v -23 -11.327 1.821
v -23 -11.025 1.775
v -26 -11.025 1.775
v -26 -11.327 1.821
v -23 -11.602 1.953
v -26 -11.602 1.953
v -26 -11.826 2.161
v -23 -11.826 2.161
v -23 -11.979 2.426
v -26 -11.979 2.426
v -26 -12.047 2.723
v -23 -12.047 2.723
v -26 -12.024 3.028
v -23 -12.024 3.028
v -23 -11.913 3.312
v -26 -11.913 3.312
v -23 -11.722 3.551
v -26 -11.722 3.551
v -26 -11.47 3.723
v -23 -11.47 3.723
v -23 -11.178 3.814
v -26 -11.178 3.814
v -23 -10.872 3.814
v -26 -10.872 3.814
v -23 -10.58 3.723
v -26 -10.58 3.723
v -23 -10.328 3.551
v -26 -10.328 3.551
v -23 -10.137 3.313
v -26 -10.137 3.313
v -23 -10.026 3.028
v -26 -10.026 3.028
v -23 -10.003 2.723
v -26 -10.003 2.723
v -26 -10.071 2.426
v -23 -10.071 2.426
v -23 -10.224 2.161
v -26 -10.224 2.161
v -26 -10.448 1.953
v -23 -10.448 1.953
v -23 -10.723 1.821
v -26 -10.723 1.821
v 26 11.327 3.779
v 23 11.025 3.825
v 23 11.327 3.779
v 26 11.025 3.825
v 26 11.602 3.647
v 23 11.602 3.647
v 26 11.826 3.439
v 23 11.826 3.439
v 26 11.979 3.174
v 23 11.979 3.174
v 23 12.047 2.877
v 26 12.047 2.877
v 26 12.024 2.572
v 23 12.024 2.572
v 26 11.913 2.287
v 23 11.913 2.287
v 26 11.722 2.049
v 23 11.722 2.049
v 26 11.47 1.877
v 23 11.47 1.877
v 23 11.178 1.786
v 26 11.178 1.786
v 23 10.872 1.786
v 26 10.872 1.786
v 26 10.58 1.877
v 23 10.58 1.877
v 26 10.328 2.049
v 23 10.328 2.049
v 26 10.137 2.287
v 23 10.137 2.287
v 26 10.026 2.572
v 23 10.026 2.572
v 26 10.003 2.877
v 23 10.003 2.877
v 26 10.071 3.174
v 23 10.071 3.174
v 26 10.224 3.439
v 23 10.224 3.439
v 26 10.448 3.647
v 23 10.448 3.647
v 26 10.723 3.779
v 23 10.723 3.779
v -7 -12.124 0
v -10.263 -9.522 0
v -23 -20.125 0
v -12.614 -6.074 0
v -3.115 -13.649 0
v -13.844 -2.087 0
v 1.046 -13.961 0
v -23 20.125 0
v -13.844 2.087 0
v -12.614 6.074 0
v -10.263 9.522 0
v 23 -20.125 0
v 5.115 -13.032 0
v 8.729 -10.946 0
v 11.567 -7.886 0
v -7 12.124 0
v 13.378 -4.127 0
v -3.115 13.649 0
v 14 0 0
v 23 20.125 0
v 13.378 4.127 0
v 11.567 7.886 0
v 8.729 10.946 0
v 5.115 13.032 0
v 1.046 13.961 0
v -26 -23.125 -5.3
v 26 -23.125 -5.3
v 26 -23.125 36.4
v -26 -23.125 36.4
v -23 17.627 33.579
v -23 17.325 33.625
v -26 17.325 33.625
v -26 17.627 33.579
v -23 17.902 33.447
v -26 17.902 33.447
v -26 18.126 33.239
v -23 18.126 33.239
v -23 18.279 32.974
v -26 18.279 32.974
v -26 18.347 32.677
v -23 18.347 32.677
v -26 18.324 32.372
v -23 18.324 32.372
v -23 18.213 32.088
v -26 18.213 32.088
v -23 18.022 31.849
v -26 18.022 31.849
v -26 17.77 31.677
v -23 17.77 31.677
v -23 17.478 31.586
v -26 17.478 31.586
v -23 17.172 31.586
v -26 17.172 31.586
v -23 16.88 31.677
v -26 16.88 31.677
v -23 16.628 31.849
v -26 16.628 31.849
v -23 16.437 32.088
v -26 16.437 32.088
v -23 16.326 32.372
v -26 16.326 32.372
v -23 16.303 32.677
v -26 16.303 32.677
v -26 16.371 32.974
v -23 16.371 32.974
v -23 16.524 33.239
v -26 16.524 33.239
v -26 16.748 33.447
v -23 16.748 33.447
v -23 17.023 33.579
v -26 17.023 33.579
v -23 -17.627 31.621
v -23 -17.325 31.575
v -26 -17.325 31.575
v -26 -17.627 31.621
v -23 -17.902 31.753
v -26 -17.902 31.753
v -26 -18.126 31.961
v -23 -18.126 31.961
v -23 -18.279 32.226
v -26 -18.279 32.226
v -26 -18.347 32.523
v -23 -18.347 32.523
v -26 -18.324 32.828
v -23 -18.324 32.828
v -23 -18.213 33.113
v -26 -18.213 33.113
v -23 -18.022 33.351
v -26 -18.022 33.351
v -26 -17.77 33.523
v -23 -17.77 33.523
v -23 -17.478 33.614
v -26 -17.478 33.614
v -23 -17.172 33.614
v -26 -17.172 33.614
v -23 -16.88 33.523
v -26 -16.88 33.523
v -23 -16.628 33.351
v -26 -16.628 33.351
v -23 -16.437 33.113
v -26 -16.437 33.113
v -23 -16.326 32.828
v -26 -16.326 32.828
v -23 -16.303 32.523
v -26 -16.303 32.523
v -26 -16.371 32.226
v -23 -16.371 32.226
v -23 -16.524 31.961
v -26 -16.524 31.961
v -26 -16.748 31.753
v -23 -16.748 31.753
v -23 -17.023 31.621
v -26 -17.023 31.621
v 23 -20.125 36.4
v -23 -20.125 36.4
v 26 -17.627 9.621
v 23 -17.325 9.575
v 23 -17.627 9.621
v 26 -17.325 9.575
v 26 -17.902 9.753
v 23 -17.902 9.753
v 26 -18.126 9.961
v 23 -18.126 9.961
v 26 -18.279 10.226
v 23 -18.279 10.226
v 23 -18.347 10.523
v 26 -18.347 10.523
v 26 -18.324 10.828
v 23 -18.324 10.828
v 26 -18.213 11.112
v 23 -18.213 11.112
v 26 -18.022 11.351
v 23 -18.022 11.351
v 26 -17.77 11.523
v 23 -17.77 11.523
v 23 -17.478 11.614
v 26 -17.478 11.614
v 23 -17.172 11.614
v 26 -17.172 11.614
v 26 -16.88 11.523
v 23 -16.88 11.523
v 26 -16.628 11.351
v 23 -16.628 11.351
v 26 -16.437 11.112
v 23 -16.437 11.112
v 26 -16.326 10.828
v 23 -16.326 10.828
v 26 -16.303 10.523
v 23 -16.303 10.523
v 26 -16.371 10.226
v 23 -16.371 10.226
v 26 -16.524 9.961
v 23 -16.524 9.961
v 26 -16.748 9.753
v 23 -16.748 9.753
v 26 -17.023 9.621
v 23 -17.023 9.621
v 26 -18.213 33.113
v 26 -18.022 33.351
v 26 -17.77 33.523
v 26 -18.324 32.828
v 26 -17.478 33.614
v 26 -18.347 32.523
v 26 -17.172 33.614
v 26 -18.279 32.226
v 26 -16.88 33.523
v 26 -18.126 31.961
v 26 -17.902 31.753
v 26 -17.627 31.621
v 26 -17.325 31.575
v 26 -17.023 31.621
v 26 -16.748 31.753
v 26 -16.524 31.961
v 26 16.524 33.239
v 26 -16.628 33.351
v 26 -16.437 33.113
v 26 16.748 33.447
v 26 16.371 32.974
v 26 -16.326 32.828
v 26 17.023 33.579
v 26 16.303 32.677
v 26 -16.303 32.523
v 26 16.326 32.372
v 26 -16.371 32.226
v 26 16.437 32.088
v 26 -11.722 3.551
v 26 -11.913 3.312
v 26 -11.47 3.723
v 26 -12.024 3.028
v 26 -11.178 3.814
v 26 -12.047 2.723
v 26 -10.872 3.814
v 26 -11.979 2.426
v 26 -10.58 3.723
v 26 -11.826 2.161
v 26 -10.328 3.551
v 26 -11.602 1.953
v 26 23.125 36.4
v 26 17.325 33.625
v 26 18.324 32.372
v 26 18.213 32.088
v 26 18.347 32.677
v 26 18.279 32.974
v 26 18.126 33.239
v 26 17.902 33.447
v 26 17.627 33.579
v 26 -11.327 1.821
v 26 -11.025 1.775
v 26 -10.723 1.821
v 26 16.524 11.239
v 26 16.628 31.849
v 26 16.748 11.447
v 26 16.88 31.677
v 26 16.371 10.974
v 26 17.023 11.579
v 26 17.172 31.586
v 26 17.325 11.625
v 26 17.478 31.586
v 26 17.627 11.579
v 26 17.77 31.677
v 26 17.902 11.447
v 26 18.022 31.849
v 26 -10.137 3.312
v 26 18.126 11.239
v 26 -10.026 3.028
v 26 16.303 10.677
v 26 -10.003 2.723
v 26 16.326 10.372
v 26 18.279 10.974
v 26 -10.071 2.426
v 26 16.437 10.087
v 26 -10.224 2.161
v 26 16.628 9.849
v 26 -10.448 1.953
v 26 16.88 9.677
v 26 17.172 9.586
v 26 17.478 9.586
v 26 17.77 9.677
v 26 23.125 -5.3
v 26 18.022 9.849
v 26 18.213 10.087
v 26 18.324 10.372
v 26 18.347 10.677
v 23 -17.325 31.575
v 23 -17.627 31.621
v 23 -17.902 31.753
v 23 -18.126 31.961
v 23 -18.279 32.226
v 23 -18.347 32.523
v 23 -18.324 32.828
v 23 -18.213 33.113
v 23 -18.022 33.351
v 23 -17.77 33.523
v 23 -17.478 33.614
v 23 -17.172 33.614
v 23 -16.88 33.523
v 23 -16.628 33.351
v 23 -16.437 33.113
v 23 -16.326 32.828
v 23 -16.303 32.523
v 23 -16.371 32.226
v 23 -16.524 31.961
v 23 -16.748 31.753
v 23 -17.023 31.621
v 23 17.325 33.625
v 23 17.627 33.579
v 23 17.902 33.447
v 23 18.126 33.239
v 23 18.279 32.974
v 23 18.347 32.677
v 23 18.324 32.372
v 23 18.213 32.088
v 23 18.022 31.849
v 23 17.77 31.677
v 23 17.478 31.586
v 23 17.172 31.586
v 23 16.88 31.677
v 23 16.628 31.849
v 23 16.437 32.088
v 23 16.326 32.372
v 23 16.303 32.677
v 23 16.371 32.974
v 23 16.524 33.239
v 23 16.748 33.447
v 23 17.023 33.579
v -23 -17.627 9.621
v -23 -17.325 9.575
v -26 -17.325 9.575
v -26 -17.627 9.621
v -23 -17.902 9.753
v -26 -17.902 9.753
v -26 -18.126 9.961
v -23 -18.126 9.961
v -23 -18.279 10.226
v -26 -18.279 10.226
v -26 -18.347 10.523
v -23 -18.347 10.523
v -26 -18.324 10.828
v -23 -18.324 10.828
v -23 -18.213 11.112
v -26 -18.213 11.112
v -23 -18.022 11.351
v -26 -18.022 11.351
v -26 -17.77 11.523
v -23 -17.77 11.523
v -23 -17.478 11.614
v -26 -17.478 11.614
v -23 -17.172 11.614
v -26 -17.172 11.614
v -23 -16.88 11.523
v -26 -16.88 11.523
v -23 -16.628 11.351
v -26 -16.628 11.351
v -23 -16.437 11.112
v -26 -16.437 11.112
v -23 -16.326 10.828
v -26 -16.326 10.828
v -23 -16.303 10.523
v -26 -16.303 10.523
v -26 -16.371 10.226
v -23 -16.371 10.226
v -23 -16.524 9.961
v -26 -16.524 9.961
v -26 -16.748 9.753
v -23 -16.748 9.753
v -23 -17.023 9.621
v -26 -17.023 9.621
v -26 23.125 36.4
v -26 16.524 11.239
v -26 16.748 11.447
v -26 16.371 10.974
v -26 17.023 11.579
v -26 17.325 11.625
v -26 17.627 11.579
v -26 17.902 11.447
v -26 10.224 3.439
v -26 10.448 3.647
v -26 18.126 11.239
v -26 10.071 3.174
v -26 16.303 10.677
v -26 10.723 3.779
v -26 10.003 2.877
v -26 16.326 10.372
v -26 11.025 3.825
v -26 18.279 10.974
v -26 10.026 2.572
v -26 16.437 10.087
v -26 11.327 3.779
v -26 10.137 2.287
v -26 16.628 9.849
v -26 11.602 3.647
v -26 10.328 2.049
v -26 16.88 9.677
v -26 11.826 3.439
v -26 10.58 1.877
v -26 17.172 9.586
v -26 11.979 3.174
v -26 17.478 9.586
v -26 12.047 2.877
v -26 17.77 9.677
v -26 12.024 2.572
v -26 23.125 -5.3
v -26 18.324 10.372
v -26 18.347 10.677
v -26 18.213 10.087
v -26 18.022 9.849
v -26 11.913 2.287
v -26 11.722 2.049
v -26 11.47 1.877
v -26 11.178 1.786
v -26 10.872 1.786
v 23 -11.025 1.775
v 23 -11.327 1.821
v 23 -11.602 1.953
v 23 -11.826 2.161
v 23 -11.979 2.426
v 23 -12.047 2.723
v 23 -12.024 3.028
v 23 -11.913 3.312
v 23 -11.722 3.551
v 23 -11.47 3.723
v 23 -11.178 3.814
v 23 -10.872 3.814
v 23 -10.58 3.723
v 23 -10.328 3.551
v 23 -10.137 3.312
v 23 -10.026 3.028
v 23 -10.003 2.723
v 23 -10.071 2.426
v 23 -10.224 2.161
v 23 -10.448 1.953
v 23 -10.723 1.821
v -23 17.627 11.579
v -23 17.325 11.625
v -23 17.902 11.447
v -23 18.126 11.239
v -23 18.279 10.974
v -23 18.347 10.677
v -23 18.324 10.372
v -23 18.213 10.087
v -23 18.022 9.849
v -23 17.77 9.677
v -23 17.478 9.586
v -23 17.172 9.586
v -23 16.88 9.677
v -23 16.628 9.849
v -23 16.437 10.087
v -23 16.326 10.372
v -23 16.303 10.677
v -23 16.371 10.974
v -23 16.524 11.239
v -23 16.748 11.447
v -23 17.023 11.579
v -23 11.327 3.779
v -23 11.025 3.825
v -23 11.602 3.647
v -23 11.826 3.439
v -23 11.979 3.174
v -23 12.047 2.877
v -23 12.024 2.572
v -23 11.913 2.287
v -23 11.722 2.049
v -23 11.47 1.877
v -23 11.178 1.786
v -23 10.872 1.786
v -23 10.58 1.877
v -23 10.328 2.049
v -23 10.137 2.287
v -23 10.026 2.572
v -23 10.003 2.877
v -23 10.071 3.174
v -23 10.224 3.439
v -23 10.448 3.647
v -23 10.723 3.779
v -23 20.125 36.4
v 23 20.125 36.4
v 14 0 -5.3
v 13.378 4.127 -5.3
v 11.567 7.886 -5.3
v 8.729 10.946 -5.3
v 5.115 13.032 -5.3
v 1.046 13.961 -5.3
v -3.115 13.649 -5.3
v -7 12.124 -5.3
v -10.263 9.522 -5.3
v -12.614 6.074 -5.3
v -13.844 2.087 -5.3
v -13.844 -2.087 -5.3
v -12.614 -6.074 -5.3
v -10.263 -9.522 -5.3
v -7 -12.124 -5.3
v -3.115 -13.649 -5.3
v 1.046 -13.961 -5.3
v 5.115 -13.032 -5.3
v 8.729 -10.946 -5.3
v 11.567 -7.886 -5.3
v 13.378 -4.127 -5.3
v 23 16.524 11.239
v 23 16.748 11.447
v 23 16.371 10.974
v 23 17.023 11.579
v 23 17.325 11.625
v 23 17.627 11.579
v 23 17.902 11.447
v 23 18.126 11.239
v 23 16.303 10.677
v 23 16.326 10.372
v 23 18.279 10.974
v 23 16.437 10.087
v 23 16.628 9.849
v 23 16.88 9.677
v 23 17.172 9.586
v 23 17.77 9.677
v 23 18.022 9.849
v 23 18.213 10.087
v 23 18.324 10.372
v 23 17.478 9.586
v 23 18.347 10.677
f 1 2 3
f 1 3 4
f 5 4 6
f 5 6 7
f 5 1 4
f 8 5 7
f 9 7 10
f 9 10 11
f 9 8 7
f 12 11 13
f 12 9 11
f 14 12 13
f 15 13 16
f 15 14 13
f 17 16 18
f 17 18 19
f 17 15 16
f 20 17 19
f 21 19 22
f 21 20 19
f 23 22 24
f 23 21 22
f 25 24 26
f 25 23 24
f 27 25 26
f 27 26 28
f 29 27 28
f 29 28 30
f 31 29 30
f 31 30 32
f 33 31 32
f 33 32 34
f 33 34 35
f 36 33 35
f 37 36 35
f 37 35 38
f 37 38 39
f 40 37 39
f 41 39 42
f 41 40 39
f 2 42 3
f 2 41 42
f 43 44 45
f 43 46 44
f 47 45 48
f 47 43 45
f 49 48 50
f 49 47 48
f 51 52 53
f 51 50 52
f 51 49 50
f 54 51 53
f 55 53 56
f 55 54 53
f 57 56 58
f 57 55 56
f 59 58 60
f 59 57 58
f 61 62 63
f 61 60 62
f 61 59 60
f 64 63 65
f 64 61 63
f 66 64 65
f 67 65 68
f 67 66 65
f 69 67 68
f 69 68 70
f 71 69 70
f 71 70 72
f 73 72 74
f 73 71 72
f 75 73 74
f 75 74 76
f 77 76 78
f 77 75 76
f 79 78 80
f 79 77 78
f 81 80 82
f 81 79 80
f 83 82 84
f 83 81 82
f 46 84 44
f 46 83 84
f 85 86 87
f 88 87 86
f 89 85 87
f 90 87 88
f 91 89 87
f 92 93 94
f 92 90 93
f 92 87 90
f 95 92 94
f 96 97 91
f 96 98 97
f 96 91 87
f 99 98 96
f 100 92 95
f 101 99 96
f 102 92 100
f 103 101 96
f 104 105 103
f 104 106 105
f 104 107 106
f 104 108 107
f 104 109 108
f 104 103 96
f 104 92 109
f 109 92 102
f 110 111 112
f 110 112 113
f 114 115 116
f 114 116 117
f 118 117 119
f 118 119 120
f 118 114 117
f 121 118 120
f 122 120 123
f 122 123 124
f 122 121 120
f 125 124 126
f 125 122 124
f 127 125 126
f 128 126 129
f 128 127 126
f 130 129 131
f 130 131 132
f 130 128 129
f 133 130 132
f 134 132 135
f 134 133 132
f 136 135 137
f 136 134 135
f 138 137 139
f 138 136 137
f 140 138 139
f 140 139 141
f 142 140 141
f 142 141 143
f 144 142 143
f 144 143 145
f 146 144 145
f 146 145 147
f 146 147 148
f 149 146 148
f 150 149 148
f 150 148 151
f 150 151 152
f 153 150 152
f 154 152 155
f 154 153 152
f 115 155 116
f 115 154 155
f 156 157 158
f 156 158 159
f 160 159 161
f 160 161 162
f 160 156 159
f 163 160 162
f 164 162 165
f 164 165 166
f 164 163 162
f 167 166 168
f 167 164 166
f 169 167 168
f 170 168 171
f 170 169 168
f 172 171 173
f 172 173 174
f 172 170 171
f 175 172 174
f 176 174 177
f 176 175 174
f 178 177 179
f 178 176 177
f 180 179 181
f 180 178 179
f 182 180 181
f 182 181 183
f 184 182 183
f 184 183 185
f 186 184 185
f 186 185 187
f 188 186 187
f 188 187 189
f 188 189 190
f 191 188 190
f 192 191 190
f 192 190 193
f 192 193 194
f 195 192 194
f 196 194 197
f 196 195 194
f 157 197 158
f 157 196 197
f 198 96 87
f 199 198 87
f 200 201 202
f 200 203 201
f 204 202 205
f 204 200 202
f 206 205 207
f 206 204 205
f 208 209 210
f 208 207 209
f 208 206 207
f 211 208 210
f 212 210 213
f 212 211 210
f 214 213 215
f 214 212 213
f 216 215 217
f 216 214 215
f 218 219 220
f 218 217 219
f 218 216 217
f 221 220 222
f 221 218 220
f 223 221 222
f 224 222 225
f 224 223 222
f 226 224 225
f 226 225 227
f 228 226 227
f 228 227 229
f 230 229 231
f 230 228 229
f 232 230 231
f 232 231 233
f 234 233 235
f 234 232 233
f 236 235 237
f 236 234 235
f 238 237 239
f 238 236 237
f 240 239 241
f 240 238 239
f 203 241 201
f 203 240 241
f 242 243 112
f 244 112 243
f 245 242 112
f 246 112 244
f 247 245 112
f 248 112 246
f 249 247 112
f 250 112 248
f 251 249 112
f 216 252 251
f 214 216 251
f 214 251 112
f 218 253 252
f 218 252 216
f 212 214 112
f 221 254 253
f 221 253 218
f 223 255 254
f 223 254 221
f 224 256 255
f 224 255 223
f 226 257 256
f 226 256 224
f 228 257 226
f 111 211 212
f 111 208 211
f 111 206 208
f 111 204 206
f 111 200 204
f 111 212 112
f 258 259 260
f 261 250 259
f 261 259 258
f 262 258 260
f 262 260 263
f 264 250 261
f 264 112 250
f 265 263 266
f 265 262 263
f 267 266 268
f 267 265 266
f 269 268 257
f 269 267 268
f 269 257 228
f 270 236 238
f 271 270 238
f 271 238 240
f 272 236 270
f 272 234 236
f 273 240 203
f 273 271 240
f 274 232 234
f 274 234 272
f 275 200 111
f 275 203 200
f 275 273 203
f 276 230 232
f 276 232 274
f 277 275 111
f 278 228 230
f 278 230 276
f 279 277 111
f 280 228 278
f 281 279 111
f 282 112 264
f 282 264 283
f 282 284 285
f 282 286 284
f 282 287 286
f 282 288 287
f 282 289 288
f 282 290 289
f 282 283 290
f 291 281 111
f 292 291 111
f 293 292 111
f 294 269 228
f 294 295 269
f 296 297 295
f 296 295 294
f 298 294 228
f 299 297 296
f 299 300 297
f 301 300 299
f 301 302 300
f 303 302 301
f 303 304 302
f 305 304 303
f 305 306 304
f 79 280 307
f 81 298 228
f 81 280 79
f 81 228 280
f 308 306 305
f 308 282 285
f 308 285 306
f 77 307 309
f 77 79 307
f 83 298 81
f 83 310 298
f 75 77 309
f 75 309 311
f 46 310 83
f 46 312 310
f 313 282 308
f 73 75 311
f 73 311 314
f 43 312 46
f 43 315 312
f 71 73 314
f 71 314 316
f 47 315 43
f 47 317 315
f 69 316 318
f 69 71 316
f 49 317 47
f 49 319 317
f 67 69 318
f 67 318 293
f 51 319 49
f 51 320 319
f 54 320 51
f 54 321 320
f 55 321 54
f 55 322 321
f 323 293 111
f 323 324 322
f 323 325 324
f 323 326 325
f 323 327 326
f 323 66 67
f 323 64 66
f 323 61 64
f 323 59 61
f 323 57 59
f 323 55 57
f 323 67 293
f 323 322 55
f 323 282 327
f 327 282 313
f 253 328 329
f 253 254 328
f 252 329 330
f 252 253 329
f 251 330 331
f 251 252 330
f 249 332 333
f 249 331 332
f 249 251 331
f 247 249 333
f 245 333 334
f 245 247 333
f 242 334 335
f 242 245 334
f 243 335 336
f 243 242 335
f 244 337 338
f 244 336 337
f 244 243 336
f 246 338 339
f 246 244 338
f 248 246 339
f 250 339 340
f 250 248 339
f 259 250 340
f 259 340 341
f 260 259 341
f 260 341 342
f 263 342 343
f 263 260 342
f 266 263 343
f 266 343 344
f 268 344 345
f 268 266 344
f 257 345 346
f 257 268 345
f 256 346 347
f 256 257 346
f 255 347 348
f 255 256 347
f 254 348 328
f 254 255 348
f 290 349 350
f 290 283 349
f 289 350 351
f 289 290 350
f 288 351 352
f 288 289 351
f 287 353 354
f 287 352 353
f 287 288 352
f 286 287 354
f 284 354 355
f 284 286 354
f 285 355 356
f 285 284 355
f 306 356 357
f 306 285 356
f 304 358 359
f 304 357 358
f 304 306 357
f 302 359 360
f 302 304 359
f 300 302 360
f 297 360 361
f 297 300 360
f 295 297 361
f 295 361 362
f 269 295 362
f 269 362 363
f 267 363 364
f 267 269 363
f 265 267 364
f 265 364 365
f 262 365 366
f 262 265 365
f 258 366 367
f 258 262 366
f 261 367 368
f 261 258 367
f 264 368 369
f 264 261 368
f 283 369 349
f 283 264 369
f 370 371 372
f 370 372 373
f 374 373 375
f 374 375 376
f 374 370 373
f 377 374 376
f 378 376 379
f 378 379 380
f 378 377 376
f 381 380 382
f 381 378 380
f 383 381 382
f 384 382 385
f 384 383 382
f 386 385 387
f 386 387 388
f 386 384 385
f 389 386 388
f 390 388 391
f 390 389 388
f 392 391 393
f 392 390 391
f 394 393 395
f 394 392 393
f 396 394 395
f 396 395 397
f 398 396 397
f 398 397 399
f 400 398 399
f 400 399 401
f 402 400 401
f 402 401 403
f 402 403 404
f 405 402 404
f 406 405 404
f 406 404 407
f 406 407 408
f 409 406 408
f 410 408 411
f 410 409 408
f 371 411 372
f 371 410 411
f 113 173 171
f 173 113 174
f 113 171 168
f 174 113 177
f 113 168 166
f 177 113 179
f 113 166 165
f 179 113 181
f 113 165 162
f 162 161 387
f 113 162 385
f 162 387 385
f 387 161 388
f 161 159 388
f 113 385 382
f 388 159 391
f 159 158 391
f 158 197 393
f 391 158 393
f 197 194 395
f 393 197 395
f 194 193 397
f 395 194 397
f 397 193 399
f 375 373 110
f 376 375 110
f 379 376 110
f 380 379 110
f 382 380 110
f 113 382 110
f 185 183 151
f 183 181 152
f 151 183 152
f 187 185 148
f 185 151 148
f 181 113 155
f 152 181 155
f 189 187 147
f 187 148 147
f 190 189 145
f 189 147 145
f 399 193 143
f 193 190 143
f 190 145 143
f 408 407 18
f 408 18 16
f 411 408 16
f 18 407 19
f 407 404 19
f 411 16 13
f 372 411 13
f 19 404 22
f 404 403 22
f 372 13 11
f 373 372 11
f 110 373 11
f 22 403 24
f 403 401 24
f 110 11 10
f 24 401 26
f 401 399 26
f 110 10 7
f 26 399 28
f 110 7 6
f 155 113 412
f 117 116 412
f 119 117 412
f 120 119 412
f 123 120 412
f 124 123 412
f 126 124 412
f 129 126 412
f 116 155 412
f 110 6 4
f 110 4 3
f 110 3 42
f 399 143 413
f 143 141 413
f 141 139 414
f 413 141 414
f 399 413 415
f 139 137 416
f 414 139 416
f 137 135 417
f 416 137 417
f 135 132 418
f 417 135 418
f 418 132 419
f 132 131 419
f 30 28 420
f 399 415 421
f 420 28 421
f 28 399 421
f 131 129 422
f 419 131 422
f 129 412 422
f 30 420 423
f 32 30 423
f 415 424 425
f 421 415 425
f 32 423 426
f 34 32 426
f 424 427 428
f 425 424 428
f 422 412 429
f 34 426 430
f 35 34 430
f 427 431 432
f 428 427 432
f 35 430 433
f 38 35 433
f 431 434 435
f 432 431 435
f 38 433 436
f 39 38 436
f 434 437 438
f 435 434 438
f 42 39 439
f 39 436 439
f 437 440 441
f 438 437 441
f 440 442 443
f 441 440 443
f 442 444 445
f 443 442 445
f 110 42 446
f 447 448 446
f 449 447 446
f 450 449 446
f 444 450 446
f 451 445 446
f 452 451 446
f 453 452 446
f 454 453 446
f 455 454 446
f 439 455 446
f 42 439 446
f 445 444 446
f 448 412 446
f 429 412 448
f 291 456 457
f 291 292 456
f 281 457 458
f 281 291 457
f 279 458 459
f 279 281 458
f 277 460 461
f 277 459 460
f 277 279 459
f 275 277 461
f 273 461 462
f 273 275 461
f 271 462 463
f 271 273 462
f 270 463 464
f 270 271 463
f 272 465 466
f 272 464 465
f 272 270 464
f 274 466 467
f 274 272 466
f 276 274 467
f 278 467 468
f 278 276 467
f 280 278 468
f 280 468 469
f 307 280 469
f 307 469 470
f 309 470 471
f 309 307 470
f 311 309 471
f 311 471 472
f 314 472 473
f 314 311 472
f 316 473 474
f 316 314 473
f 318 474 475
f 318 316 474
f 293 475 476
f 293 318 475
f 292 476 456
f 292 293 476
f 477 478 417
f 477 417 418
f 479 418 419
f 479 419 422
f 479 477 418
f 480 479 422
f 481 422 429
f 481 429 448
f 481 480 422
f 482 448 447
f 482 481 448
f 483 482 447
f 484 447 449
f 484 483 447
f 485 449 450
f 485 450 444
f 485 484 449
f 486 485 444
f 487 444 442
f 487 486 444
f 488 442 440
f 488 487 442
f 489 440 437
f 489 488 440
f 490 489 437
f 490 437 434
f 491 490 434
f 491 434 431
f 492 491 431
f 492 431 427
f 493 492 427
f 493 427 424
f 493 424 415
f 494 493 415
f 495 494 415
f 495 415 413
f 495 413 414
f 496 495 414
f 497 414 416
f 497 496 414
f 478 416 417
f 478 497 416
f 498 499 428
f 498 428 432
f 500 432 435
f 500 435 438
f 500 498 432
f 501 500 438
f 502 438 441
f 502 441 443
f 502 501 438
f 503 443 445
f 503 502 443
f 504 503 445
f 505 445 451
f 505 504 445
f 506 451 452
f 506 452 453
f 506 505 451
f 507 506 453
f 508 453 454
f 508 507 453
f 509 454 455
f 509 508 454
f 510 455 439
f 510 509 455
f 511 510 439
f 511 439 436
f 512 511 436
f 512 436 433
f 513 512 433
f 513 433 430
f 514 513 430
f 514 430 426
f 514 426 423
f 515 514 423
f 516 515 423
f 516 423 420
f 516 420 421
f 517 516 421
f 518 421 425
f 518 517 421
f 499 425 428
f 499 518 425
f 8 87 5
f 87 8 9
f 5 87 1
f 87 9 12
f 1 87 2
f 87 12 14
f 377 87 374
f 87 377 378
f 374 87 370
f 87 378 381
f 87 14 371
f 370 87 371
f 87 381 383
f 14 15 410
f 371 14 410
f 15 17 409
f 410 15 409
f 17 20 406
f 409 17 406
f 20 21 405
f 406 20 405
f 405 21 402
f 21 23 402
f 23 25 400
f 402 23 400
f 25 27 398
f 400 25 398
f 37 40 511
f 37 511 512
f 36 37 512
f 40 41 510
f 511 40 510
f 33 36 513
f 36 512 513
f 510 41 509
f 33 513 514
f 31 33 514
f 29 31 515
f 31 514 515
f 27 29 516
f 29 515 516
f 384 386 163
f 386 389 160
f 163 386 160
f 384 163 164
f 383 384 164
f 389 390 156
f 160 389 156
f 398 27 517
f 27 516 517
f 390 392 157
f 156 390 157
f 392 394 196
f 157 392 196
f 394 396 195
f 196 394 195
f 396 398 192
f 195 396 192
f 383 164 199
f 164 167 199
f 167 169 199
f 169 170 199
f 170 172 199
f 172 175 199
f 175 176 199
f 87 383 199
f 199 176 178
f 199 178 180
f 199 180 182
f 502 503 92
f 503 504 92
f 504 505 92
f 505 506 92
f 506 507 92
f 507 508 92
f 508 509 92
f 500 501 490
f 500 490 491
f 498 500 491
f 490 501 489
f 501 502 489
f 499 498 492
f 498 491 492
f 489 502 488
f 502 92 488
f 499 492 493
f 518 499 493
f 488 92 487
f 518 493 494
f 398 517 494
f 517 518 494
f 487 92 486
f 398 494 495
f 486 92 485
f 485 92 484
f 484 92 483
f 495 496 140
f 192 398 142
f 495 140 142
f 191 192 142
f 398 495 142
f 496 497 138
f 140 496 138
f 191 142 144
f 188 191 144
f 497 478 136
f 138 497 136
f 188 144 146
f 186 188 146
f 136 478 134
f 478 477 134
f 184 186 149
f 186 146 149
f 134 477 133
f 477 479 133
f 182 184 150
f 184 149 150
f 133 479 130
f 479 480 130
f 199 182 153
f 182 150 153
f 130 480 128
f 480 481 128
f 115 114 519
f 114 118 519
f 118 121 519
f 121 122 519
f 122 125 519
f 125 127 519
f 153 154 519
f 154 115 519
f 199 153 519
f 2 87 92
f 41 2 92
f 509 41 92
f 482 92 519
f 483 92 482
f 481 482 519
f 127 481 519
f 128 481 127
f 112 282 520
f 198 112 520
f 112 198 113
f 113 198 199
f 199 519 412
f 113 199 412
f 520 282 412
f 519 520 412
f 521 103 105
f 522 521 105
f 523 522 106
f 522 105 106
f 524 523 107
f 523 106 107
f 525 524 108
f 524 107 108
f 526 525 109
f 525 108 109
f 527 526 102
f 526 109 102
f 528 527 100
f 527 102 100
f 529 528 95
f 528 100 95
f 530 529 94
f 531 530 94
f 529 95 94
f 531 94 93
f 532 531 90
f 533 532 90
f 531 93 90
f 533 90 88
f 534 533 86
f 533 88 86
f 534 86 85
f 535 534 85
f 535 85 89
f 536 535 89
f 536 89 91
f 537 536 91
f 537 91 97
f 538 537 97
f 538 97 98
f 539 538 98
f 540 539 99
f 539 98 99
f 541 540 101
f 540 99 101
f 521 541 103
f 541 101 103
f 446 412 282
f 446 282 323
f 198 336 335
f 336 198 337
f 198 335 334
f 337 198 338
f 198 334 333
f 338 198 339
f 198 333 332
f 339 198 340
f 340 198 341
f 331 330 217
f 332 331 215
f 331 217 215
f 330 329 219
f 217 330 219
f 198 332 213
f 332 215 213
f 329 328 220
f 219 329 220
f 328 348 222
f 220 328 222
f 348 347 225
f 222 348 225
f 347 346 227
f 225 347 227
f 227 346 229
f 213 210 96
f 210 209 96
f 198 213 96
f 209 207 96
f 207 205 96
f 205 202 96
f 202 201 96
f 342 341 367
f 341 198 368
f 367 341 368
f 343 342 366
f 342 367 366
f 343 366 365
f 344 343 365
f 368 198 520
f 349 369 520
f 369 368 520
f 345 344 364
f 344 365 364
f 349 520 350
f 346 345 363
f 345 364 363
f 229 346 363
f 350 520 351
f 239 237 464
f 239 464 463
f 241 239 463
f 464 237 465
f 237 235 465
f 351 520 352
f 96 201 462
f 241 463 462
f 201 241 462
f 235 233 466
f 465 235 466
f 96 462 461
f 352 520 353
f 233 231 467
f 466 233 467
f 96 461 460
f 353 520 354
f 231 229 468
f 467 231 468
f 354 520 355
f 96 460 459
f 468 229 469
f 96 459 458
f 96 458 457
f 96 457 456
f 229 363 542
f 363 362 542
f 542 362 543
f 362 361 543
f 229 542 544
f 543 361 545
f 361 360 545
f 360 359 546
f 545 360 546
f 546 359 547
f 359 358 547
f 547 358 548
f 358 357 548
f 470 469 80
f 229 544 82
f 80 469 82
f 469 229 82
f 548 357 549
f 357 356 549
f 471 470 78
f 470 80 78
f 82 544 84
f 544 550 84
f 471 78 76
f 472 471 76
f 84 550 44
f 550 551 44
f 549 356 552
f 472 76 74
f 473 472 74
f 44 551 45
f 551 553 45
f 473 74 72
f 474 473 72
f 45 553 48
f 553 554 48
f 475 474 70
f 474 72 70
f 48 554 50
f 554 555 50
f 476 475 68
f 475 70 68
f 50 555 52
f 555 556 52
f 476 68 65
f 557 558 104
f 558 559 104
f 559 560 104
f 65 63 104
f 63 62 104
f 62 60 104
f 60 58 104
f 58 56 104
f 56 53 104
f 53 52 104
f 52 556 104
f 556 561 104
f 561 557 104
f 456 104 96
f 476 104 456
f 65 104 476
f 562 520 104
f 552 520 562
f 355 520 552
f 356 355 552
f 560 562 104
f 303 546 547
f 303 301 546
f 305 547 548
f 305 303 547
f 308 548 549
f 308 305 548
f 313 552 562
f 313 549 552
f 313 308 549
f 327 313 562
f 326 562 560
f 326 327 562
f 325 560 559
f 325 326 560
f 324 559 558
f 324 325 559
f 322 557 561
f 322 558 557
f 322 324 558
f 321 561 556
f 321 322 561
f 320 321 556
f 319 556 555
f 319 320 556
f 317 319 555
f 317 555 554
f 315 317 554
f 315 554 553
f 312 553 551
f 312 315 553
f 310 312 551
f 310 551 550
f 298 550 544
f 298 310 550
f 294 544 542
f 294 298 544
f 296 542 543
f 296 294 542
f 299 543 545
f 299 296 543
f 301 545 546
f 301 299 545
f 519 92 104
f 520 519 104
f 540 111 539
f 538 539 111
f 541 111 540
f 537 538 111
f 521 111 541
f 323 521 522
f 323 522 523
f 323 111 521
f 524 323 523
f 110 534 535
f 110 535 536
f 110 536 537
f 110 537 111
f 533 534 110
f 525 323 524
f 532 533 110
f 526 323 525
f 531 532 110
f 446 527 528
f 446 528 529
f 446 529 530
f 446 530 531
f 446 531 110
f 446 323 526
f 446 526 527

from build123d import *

# Parameters (mm, degrees)
ESBO_O1_W                  = 46
ESBO_O1_H                  = 40.25
ESBO_O1_R                  = 14
RESSALTO_EXTRUS_O1_DEPTH   = 5.3
ESBO_O2_W                  = 41.7
ESBO_O2_H                  = 40.25
ESBO_O2_R                  = 1.025
RESSALTO_EXTRUS_O2_DEPTH   = 3
ESBO_O3_W                  = 49
ESBO_O3_H                  = 41.7
RESSALTO_EXTRUS_O3_DEPTH   = 3
ESBO_O4_W                  = 41.7
ESBO_O4_H                  = 43.25
RESSALTO_EXTRUS_O4_DEPTH   = 3
ESBO_O5_W                  = 52
ESBO_O5_H                  = 41.7
RESSALTO_EXTRUS_O5_DEPTH   = 3
CORTE_EXTRUS_O1_DEPTH      = 66.274234005
CORTE_EXTRUS_O1_DEPTH_BACK = 66.274234005
ESBO_O7_R                  = 1.025


with BuildPart() as part:
    # Esboço1 → Ressalto-extrusão1 (new body)
    with BuildSketch(Plane.XY):
        Rectangle(ESBO_O1_W, ESBO_O1_H)
        Circle(ESBO_O1_R, mode=Mode.SUBTRACT)
    extrude(amount=-RESSALTO_EXTRUS_O1_DEPTH)

    # Esboço2 → Ressalto-extrusão2 (add)
    with BuildSketch(Plane.ZY.offset(23)):
        with Locations((15.55, 0)):
            Rectangle(ESBO_O2_W, ESBO_O2_H)
        with Locations((32.6, 17.325)):
            Circle(ESBO_O2_R, mode=Mode.SUBTRACT)
        with Locations((10.6, 17.325)):
            Circle(ESBO_O2_R, mode=Mode.SUBTRACT)
        with Locations(Location((10.6, -17.325, 0), (0, 0, 180))):
            Circle(ESBO_O2_R, mode=Mode.SUBTRACT)
        with Locations(Location((32.6, -17.325, 0), (0, 0, 180))):
            Circle(ESBO_O2_R, mode=Mode.SUBTRACT)
        with Locations((2.8, 11.025)):
            Circle(ESBO_O2_R, mode=Mode.SUBTRACT)
        with Locations(Location((2.8, -11.025, 0), (0, 0, 180))):
            Circle(ESBO_O2_R, mode=Mode.SUBTRACT)
    extrude(amount=RESSALTO_EXTRUS_O2_DEPTH)

    # Esboço3 → Ressalto-extrusão3 (add)
    with BuildSketch(Plane(origin=(0, 20.125, 0), x_dir=(1, 0, 0), z_dir=(0, 1, 0))):
        with Locations((-1.5, -15.55)):
            Rectangle(ESBO_O3_W, ESBO_O3_H)
    extrude(amount=RESSALTO_EXTRUS_O3_DEPTH)

    # Esboço4 → Ressalto-extrusão4 (add)
    with BuildSketch(Plane(origin=(23, 0, 0), x_dir=(0, 0, -1), z_dir=(1, 0, 0))):
        with Locations((-15.55, 1.5)):
            Rectangle(ESBO_O4_W, ESBO_O4_H)
    extrude(amount=RESSALTO_EXTRUS_O4_DEPTH)

    # Esboço5 → Ressalto-extrusão5 (add)
    with BuildSketch(Plane(origin=(0, -20.125, 0), x_dir=(-1, 0, 0), z_dir=(0, -1, 0))):
        with Locations((0, -15.55)):
            Rectangle(ESBO_O5_W, ESBO_O5_H)
    extrude(amount=RESSALTO_EXTRUS_O5_DEPTH)

    # Esboço7 → Corte-extrusão1 (cut, two sides: drawn at the far end of the back side and taken through both)
    with BuildSketch(Plane.ZY.offset(23).offset(-CORTE_EXTRUS_O1_DEPTH_BACK)):
        with Locations((2.8, 11.025)):
            Circle(ESBO_O7_R)
        with Locations((10.6, 17.325)):
            Circle(ESBO_O7_R)
        with Locations((32.6, 17.325)):
            Circle(ESBO_O7_R)
        with Locations(Location((2.8, -11.025, 0), (0, 0, 180))):
            Circle(ESBO_O7_R)
        with Locations(Location((10.6, -17.325, 0), (0, 0, 180))):
            Circle(ESBO_O7_R)
        with Locations(Location((32.6, -17.325, 0), (0, 0, 180))):
            Circle(ESBO_O7_R)
    extrude(amount=CORTE_EXTRUS_O1_DEPTH + CORTE_EXTRUS_O1_DEPTH_BACK, mode=Mode.SUBTRACT)


solid = part.part
